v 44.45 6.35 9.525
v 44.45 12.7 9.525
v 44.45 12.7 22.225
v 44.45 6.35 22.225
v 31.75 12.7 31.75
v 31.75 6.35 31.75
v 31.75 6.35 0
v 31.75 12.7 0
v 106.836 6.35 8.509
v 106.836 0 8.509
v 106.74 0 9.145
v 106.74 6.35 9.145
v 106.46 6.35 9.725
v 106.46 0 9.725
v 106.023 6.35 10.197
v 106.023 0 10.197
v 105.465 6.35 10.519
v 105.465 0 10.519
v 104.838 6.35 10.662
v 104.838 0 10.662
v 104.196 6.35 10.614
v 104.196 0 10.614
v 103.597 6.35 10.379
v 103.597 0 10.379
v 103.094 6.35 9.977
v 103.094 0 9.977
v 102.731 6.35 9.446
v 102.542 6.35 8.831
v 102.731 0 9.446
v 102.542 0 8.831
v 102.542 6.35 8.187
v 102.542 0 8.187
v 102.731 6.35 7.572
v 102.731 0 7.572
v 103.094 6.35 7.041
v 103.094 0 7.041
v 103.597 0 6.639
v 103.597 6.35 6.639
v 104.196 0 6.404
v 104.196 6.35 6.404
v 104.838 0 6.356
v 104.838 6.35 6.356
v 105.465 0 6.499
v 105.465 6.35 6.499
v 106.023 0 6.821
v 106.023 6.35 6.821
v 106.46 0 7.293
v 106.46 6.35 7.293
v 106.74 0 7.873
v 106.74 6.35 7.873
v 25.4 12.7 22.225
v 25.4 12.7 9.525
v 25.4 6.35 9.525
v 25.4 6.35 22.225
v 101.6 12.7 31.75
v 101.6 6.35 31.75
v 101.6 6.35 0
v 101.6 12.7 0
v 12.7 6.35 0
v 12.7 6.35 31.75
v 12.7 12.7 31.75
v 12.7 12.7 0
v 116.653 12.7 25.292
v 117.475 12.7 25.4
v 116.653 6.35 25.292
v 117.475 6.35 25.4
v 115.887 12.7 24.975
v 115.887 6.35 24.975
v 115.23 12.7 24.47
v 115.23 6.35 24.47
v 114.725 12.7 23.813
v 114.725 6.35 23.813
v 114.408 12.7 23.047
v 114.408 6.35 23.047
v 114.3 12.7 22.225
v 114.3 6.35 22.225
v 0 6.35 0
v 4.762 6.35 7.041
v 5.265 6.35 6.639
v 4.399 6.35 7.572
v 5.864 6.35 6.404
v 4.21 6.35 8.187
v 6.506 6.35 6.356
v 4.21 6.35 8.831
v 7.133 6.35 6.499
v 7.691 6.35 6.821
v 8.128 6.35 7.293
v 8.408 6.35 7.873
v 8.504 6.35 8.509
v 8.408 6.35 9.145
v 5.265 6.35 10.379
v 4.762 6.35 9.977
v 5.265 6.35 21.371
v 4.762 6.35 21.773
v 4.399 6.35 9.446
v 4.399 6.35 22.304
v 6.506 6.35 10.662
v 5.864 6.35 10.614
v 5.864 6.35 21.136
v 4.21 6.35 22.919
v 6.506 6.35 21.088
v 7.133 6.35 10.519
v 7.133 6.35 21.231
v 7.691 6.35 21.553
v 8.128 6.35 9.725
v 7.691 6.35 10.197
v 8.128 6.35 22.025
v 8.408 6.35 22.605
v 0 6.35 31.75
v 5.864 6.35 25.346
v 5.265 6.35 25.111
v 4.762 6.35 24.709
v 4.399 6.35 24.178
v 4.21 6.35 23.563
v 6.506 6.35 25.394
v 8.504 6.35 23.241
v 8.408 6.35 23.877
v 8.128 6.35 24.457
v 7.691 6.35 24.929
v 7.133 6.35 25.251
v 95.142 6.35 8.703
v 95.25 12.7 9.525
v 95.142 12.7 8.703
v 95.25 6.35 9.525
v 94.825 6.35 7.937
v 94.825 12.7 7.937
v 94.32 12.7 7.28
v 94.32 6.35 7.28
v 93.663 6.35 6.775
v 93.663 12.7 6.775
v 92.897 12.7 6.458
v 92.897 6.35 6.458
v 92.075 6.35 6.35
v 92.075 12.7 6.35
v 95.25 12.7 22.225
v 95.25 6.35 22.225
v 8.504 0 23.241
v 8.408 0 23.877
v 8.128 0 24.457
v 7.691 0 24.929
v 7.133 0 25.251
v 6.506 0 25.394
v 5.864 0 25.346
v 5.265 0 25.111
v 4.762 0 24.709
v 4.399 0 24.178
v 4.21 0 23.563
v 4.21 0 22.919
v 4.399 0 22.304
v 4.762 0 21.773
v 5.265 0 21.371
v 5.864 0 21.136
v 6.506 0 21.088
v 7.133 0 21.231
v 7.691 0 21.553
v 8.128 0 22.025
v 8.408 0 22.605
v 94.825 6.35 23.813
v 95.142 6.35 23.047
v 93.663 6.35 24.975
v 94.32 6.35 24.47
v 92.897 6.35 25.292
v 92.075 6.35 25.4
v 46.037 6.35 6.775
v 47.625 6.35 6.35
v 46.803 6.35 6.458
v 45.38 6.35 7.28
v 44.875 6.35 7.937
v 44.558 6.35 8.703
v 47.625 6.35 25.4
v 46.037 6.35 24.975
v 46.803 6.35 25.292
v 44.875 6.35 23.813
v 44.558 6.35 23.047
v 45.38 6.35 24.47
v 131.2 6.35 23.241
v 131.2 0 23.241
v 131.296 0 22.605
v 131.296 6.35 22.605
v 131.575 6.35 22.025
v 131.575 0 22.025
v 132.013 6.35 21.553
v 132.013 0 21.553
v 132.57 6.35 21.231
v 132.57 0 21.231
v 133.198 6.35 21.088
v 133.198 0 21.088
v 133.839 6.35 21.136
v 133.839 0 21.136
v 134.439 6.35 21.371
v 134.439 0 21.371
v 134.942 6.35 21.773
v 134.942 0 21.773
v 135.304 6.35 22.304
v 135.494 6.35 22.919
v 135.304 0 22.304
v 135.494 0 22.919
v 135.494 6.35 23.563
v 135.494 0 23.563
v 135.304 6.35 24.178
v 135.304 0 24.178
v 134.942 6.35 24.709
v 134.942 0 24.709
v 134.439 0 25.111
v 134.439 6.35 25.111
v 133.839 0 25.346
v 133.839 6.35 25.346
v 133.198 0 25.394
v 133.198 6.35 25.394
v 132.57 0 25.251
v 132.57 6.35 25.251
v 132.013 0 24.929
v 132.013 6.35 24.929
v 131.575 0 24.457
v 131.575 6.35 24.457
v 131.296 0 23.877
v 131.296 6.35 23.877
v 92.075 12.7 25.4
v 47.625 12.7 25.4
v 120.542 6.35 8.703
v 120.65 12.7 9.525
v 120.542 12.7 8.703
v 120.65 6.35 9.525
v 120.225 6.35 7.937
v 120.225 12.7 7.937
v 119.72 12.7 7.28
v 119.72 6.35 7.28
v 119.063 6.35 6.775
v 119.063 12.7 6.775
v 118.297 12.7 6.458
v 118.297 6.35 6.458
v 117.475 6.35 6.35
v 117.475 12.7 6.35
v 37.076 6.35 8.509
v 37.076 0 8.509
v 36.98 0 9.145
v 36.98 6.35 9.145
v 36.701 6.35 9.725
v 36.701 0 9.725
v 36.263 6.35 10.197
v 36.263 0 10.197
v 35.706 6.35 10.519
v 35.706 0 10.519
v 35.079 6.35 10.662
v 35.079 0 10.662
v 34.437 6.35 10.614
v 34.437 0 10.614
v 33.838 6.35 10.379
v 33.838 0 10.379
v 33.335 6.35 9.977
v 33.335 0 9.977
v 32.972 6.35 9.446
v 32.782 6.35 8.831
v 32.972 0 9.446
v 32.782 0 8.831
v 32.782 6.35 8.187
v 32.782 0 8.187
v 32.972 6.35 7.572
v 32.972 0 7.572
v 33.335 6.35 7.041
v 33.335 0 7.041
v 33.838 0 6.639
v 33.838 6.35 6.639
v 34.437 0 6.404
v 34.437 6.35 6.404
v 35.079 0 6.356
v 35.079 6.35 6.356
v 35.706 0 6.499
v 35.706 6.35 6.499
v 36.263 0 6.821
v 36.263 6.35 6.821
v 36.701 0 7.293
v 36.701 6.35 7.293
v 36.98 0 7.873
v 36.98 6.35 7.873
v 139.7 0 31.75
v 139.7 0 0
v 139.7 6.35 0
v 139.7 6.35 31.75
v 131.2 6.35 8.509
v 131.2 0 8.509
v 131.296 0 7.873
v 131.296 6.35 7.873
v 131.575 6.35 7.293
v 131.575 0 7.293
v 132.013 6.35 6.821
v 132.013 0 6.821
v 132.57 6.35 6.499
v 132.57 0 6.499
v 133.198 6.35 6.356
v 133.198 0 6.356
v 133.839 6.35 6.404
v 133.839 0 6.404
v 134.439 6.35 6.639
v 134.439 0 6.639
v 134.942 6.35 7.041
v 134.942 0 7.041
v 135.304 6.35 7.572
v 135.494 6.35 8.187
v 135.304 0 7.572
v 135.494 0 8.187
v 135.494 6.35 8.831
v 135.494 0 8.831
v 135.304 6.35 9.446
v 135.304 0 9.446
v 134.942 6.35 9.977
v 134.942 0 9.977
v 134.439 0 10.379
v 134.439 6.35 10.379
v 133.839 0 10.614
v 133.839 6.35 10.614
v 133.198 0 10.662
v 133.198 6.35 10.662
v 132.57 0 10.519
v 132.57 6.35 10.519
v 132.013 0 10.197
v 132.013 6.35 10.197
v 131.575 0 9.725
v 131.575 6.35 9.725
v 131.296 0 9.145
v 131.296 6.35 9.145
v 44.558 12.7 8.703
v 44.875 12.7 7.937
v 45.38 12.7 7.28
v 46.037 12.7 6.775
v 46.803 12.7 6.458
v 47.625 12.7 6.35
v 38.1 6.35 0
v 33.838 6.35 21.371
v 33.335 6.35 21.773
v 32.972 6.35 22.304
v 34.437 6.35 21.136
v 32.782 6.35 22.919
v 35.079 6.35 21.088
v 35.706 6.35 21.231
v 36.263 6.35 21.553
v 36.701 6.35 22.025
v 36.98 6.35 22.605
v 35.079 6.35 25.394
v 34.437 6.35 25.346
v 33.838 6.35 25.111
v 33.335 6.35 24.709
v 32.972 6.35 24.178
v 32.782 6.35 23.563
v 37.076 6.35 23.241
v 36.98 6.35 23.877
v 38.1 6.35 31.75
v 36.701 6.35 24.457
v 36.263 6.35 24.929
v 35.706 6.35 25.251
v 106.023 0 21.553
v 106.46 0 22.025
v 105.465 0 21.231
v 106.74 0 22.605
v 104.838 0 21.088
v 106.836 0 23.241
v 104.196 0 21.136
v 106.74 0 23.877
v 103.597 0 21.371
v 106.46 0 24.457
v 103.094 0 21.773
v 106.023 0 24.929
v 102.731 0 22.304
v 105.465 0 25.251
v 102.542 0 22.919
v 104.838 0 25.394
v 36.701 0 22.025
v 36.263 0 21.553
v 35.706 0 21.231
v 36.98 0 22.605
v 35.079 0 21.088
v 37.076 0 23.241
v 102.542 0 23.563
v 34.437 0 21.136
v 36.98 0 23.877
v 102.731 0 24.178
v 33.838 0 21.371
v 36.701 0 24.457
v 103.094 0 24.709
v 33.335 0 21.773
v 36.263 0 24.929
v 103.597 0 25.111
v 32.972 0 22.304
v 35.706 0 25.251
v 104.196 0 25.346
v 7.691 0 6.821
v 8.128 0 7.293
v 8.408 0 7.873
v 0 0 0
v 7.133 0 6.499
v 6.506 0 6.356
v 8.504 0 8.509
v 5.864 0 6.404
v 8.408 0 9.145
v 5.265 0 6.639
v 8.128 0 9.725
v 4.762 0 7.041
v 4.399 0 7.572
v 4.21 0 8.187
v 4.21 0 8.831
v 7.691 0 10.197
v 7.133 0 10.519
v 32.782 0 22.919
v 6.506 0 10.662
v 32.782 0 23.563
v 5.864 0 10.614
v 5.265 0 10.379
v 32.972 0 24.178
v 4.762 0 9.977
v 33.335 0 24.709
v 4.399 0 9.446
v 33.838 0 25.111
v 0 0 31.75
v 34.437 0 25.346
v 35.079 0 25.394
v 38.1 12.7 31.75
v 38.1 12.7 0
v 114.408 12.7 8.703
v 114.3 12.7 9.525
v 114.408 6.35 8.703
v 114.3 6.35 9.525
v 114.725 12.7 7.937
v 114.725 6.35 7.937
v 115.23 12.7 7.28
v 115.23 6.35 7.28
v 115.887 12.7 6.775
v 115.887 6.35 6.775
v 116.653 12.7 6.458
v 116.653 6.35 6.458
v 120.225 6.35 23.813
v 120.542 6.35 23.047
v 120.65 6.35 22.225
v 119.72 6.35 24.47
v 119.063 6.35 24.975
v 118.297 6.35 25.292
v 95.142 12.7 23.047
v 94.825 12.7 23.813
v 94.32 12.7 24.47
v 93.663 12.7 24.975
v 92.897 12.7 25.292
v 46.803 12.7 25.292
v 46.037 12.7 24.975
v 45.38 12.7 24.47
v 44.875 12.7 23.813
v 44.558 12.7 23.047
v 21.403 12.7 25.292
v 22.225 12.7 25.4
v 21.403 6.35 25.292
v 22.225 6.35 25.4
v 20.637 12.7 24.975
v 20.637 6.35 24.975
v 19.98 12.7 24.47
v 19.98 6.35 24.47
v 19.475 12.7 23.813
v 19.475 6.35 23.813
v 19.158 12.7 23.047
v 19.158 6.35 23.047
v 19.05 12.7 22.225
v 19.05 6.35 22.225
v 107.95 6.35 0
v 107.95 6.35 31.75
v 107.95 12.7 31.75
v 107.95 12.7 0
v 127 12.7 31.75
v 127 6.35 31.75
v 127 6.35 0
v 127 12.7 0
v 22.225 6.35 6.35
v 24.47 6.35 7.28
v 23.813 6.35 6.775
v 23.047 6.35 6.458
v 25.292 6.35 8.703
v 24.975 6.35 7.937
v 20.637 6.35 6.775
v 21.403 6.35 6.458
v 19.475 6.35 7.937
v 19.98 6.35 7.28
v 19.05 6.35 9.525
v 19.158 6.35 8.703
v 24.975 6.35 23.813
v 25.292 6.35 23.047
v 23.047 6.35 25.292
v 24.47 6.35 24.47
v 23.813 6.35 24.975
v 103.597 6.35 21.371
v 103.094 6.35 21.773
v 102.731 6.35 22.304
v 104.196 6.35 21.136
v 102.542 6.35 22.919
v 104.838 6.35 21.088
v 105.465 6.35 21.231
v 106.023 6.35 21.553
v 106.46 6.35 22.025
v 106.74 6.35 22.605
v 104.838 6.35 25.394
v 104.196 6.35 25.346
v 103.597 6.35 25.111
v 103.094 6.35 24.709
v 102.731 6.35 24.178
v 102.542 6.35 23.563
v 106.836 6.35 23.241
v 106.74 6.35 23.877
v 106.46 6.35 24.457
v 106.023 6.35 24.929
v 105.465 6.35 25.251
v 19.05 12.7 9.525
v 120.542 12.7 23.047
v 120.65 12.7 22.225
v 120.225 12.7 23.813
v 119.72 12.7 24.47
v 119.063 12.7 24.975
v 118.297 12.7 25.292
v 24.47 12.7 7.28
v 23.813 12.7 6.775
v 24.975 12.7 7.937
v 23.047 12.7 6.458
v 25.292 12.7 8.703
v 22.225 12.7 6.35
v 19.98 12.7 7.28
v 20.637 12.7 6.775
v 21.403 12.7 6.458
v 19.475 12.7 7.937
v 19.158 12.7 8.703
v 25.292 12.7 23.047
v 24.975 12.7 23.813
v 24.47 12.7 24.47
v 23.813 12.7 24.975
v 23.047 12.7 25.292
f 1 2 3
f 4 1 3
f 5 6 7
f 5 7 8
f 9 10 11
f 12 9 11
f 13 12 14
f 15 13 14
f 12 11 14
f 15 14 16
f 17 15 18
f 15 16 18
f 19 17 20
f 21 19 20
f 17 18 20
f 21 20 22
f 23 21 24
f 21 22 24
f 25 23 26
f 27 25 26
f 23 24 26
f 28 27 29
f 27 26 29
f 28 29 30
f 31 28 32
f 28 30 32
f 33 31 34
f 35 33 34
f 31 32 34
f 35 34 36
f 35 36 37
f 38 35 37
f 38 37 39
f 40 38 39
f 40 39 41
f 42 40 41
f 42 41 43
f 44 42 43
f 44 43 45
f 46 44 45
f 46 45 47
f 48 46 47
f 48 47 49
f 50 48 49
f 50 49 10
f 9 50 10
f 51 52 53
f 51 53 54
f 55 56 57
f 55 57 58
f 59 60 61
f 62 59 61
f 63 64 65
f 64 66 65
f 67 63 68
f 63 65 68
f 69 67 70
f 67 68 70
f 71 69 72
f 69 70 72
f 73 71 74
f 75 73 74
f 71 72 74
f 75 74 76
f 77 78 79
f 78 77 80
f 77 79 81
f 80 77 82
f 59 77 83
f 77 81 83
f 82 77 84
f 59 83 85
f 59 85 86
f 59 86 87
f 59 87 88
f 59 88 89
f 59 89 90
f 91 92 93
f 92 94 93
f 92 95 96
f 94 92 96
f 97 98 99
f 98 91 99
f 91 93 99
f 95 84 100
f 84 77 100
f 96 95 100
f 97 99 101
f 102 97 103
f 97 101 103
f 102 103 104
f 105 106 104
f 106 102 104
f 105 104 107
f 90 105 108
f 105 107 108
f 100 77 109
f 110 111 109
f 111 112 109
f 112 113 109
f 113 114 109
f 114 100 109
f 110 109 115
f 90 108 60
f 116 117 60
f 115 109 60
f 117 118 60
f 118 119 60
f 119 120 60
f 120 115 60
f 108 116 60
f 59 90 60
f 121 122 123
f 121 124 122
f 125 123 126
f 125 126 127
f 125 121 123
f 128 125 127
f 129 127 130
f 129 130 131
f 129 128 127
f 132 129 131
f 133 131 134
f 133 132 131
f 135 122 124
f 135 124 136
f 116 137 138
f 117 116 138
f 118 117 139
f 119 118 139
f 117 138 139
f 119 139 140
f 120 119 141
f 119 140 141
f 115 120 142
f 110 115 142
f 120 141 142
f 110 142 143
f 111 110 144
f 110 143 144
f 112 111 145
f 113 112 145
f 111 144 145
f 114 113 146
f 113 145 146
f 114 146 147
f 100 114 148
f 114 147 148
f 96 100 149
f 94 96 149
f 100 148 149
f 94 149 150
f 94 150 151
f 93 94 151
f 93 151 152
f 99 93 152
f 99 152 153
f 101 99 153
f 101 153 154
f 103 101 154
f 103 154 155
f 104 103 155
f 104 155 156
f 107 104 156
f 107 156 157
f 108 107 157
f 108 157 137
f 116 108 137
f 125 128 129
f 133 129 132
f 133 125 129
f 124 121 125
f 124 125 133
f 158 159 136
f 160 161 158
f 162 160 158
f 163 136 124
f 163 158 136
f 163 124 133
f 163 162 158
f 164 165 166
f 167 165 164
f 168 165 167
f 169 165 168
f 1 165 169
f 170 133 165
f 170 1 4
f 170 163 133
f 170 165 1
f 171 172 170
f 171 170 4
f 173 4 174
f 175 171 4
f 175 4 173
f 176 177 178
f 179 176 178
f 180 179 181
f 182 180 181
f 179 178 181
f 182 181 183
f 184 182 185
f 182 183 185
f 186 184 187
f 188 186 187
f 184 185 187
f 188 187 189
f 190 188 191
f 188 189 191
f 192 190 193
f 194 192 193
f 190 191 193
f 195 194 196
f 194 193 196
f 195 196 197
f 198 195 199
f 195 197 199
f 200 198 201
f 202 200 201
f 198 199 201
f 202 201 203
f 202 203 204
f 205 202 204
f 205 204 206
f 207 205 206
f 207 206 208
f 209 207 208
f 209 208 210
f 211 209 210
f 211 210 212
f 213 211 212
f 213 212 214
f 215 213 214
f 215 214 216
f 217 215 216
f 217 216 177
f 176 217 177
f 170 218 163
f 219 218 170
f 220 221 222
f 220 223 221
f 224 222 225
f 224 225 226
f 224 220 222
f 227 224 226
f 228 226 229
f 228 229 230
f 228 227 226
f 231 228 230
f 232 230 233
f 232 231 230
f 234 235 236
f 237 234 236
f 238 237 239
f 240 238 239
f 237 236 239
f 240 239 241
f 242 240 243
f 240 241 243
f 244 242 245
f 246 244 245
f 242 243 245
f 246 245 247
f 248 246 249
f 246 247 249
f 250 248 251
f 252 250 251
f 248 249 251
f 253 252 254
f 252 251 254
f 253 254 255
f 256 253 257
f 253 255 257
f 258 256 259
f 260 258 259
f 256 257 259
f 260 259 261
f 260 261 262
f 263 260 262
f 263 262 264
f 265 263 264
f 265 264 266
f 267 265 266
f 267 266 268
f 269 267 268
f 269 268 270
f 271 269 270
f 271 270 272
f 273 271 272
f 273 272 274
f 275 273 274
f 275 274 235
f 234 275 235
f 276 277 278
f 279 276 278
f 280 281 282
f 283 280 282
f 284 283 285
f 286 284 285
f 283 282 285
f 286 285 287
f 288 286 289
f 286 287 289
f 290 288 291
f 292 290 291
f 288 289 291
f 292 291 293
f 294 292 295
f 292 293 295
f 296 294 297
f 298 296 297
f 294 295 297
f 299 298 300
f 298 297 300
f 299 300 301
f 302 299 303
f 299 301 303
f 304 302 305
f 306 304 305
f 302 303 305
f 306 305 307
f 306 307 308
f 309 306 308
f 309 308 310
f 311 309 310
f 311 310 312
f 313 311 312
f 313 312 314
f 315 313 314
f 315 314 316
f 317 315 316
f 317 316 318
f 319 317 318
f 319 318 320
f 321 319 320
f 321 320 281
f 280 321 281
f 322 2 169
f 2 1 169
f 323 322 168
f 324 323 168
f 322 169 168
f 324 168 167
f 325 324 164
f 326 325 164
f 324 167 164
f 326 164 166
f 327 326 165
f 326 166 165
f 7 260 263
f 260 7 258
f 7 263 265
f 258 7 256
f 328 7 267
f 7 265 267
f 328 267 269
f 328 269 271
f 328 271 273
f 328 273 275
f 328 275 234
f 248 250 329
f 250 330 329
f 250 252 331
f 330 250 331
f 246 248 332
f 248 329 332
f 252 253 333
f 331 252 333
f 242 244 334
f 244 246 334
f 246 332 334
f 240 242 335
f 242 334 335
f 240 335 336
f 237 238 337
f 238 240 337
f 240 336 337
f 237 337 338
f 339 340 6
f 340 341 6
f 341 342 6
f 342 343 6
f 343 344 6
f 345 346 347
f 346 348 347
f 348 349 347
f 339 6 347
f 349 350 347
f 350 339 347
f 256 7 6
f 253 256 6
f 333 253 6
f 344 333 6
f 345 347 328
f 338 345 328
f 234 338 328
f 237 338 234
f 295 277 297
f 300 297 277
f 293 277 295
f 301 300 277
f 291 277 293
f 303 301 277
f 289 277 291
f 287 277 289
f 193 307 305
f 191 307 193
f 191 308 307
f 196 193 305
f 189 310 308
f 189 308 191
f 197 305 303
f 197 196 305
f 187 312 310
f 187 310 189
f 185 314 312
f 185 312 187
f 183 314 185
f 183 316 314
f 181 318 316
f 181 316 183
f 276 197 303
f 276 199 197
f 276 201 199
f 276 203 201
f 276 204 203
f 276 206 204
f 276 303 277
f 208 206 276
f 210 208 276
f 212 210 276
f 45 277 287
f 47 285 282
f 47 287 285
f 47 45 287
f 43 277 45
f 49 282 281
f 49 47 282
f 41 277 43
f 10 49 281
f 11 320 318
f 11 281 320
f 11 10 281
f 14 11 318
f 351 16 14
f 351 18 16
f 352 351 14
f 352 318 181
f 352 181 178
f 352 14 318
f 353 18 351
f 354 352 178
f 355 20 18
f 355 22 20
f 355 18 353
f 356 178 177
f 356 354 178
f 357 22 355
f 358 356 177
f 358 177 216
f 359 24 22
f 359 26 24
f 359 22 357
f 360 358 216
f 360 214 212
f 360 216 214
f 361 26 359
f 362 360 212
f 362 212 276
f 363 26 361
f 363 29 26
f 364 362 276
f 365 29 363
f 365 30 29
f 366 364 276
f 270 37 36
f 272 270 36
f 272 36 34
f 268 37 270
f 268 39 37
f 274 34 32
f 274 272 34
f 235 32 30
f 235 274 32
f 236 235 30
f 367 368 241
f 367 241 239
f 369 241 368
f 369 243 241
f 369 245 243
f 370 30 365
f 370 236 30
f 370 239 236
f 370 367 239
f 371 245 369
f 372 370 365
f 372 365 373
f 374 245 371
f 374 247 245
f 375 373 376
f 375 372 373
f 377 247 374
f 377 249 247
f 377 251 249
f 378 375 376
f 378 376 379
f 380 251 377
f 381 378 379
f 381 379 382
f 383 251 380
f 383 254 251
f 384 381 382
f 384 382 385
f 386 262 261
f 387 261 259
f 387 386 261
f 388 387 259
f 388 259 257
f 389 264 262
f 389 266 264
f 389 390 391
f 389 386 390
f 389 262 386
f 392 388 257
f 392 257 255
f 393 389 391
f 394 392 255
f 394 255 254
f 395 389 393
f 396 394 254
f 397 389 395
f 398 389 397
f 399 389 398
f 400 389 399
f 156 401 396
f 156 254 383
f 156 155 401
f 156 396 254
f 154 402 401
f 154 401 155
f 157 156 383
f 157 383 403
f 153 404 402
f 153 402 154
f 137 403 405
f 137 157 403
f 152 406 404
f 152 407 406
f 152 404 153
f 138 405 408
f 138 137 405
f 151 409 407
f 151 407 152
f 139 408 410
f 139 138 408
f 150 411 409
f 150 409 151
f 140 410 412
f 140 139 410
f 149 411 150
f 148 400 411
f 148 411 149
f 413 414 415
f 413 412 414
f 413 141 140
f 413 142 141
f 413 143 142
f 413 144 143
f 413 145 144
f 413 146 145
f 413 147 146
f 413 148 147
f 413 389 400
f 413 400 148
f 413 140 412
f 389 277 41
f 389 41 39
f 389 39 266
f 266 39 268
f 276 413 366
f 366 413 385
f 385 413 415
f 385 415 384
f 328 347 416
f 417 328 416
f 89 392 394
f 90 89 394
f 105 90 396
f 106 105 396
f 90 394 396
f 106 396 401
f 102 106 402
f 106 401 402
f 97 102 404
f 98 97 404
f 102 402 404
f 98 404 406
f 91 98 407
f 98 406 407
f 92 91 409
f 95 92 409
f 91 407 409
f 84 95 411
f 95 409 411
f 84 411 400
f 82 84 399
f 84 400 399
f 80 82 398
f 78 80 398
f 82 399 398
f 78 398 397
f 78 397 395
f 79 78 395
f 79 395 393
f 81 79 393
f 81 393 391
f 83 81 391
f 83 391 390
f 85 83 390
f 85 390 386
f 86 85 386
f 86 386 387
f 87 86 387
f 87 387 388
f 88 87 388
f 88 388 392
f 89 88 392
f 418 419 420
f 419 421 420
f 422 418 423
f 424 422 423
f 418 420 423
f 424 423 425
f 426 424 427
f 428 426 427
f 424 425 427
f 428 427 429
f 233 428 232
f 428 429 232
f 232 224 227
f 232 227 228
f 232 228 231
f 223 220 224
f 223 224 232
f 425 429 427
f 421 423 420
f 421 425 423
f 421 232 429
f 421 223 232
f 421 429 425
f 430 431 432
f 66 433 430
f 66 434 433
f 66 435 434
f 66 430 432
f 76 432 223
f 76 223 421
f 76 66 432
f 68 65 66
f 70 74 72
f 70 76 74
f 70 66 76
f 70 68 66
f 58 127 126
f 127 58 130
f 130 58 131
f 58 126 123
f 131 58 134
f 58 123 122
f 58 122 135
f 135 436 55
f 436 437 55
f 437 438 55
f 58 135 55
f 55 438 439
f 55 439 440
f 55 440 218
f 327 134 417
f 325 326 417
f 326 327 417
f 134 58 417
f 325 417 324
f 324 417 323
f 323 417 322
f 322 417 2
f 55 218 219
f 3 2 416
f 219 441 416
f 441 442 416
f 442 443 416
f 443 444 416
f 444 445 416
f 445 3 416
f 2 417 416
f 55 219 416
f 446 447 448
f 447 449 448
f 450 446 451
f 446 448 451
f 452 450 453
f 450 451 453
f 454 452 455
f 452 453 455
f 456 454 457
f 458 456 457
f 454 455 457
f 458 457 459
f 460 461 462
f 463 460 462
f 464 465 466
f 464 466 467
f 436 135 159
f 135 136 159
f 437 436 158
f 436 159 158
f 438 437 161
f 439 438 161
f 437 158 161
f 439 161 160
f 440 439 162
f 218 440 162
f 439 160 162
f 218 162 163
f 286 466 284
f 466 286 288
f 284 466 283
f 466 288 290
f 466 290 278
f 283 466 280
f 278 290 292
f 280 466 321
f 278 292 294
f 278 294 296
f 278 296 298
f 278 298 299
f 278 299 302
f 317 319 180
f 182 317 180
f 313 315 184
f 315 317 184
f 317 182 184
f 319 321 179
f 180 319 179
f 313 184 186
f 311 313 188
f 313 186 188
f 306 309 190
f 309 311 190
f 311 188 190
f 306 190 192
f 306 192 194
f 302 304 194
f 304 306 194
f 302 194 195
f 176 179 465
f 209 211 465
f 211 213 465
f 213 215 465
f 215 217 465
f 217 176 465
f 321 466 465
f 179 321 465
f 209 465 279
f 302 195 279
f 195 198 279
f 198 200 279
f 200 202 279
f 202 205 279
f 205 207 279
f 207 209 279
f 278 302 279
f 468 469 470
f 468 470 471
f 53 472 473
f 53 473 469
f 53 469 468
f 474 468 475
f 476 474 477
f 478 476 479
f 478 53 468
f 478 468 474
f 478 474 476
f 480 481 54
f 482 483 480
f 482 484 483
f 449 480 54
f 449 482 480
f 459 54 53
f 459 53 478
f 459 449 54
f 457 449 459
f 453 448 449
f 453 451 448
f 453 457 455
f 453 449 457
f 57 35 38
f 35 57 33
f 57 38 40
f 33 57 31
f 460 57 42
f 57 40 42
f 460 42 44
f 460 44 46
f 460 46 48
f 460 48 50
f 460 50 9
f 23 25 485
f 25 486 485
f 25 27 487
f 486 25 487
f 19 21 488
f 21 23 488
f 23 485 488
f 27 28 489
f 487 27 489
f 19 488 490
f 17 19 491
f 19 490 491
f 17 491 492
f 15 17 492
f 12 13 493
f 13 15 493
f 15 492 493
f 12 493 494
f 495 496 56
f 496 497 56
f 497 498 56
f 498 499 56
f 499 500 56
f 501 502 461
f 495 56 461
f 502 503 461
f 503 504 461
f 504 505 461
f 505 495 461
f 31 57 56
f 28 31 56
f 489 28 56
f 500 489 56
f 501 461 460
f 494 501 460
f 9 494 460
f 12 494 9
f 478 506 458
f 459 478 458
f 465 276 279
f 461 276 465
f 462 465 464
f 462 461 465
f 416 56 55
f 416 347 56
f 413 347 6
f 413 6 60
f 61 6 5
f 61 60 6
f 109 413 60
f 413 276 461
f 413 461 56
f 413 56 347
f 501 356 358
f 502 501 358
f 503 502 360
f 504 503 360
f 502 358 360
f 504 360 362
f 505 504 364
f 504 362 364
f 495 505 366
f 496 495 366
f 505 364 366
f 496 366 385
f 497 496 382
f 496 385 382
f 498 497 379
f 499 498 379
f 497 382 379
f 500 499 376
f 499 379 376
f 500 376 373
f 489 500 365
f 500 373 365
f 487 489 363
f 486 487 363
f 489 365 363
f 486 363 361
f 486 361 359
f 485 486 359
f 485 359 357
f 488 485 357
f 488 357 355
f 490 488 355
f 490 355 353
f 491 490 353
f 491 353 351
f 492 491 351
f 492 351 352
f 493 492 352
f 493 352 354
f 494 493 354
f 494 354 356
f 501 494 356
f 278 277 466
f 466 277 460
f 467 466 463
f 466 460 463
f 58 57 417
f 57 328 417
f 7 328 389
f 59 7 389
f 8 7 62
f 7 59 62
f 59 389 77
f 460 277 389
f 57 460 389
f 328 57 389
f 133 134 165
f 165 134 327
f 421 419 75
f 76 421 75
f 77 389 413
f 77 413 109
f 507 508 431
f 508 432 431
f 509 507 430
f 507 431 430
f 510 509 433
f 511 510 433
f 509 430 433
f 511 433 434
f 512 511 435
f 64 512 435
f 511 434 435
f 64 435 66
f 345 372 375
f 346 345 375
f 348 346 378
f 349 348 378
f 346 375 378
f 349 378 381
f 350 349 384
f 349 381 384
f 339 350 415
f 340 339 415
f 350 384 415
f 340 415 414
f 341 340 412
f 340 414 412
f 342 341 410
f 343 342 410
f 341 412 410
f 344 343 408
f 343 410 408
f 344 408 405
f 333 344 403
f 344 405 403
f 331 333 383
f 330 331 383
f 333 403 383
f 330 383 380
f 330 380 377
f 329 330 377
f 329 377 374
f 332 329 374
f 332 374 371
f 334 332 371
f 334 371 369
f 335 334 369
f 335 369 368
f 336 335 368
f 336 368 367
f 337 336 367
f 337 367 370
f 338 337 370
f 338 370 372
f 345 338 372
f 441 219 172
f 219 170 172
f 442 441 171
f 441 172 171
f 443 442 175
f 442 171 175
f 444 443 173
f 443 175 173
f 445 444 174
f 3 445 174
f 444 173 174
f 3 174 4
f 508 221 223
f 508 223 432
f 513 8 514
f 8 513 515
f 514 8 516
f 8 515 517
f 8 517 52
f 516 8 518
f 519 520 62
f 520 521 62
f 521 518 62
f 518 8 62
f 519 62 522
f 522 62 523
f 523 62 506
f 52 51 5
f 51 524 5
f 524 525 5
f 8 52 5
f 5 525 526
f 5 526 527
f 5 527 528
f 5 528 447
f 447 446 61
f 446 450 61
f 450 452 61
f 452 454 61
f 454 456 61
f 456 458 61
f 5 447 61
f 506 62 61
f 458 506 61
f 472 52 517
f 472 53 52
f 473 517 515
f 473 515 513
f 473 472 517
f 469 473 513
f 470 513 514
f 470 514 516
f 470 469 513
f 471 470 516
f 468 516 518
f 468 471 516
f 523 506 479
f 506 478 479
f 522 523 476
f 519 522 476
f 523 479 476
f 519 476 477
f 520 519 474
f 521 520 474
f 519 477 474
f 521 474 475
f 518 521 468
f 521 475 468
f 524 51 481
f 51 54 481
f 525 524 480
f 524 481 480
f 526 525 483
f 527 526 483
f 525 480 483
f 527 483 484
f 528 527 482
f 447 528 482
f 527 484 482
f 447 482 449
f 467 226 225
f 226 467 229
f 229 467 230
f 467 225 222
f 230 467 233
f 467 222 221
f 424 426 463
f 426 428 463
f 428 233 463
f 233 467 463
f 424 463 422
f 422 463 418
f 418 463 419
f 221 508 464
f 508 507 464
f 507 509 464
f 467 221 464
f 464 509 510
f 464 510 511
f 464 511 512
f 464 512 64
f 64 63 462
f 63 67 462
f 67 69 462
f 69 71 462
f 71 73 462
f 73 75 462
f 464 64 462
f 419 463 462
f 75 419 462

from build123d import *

# Parameters (mm, degrees)
F0_W      = 12.7
F0_H      = 31.75
F1_DEPTH  = 139.7
F2_W      = 12.7
F2_H      = 6.35
F2_W_2    = 6.35
F3_DEPTH  = 31.751
F4_R      = 2.159
F5_DEPTH  = 25.4
F6_R      = 2.159
F7_DEPTH  = 25.4
F8_W      = 50.8
F8_H      = 19.05
F9_DEPTH  = 6.35
F10_W     = 6.35
F10_H     = 19.05
F11_DEPTH = 6.35
F12_R     = 3.17499


# Not quite as in the source:
# - a fillet or chamfer is up to 0.001 mm smaller than in the source, because OpenCascade refuses the exact size


with BuildPart() as f1:
    # F0 (on Right) → F1 (new body)
    with BuildSketch(Plane.YZ):
        with Locations((6.35, 15.875)):
            Rectangle(F0_W, F0_H)
    extrude(amount=F1_DEPTH)

    # F2 (on face) → F3 (cut, through all)
    with BuildSketch(Plane.XY.offset(31.75)):
        with Locations((6.35, 9.525)):
            Rectangle(F2_W, F2_H)
        with Locations((34.925, 9.525)):
            Rectangle(F2_W_2, F2_H)
        with Locations((104.775, 9.525)):
            Rectangle(F2_W_2, F2_H)
        with Locations((133.35, 9.525)):
            Rectangle(F2_W, F2_H)
    extrude(amount=-F3_DEPTH, mode=Mode.SUBTRACT)

    # F4 (on face) → F5 (cut)
    with BuildSketch(Plane.XZ):
        with Locations((6.3445889391, 23.241)):
            Circle(F4_R)
        with Locations((6.3445889391, 8.509)):
            Circle(F4_R)
        with BuildLine():
            ThreePointArc((135.5180395808, 8.509), (133.3590395808, 10.668), (131.2000395808, 8.509))
            ThreePointArc((131.2000395808, 8.509), (133.3590395808, 6.35), (135.5180395808, 8.509))
        make_face()
        with BuildLine():
            ThreePointArc((135.5180395808, 23.241), (133.3590395808, 25.4), (131.2000395808, 23.241))
            ThreePointArc((131.2000395808, 23.241), (133.3590395808, 21.082), (135.5180395808, 23.241))
        make_face()
    extrude(amount=-F5_DEPTH, mode=Mode.SUBTRACT)

    # F6 (on face) → F7 (cut)
    with BuildSketch(Plane.XZ):
        with Locations((34.9172241986, 23.241)):
            Circle(F6_R)
        with Locations((34.9172241986, 8.509)):
            Circle(F6_R)
        with Locations((104.6765521169, 8.509)):
            Circle(F6_R)
        with Locations((104.6765521169, 23.241)):
            Circle(F6_R)
    extrude(amount=-F7_DEPTH, mode=Mode.SUBTRACT)

    # F8 (on face) → F9 (cut)
    with BuildSketch(Plane(origin=(0, 12.7, 0), x_dir=(-1, 0, 0), z_dir=(0, 1, 0))):
        with Locations((-69.85, 15.875)):
            Rectangle(F8_W, F8_H)
    extrude(amount=-F9_DEPTH, mode=Mode.SUBTRACT)

    # F10 (on face) → F11 (cut)
    with BuildSketch(Plane(origin=(0, 12.7, 0), x_dir=(-1, 0, 0), z_dir=(0, 1, 0))):
        with Locations((-22.225, 15.875)):
            Rectangle(F10_W, F10_H)
        with Locations((-117.475, 15.875)):
            Rectangle(F10_W, F10_H)
    extrude(amount=-F11_DEPTH, mode=Mode.SUBTRACT)

    # F12 (radius 3.175 in the source; OpenCascade refuses exactly that, so slightly less here)
    f12_edges = [f1.edges().sort_by_distance(p)[0] for p in [
        (19.05, 9.525, 6.35),
        (25.4, 9.525, 6.35),
        (19.05, 9.525, 25.4),
        (25.4, 9.525, 25.4),
        (44.45, 9.525, 6.35),
        (95.25, 9.525, 6.35),
        (95.25, 9.525, 25.4),
        (44.45, 9.525, 25.4),
        (120.65, 9.525, 6.35),
        (120.65, 9.525, 25.4),
        (114.3, 9.525, 25.4),
        (114.3, 9.525, 6.35),
    ]]
    fillet(f12_edges, radius=F12_R)


solid = f1.part
